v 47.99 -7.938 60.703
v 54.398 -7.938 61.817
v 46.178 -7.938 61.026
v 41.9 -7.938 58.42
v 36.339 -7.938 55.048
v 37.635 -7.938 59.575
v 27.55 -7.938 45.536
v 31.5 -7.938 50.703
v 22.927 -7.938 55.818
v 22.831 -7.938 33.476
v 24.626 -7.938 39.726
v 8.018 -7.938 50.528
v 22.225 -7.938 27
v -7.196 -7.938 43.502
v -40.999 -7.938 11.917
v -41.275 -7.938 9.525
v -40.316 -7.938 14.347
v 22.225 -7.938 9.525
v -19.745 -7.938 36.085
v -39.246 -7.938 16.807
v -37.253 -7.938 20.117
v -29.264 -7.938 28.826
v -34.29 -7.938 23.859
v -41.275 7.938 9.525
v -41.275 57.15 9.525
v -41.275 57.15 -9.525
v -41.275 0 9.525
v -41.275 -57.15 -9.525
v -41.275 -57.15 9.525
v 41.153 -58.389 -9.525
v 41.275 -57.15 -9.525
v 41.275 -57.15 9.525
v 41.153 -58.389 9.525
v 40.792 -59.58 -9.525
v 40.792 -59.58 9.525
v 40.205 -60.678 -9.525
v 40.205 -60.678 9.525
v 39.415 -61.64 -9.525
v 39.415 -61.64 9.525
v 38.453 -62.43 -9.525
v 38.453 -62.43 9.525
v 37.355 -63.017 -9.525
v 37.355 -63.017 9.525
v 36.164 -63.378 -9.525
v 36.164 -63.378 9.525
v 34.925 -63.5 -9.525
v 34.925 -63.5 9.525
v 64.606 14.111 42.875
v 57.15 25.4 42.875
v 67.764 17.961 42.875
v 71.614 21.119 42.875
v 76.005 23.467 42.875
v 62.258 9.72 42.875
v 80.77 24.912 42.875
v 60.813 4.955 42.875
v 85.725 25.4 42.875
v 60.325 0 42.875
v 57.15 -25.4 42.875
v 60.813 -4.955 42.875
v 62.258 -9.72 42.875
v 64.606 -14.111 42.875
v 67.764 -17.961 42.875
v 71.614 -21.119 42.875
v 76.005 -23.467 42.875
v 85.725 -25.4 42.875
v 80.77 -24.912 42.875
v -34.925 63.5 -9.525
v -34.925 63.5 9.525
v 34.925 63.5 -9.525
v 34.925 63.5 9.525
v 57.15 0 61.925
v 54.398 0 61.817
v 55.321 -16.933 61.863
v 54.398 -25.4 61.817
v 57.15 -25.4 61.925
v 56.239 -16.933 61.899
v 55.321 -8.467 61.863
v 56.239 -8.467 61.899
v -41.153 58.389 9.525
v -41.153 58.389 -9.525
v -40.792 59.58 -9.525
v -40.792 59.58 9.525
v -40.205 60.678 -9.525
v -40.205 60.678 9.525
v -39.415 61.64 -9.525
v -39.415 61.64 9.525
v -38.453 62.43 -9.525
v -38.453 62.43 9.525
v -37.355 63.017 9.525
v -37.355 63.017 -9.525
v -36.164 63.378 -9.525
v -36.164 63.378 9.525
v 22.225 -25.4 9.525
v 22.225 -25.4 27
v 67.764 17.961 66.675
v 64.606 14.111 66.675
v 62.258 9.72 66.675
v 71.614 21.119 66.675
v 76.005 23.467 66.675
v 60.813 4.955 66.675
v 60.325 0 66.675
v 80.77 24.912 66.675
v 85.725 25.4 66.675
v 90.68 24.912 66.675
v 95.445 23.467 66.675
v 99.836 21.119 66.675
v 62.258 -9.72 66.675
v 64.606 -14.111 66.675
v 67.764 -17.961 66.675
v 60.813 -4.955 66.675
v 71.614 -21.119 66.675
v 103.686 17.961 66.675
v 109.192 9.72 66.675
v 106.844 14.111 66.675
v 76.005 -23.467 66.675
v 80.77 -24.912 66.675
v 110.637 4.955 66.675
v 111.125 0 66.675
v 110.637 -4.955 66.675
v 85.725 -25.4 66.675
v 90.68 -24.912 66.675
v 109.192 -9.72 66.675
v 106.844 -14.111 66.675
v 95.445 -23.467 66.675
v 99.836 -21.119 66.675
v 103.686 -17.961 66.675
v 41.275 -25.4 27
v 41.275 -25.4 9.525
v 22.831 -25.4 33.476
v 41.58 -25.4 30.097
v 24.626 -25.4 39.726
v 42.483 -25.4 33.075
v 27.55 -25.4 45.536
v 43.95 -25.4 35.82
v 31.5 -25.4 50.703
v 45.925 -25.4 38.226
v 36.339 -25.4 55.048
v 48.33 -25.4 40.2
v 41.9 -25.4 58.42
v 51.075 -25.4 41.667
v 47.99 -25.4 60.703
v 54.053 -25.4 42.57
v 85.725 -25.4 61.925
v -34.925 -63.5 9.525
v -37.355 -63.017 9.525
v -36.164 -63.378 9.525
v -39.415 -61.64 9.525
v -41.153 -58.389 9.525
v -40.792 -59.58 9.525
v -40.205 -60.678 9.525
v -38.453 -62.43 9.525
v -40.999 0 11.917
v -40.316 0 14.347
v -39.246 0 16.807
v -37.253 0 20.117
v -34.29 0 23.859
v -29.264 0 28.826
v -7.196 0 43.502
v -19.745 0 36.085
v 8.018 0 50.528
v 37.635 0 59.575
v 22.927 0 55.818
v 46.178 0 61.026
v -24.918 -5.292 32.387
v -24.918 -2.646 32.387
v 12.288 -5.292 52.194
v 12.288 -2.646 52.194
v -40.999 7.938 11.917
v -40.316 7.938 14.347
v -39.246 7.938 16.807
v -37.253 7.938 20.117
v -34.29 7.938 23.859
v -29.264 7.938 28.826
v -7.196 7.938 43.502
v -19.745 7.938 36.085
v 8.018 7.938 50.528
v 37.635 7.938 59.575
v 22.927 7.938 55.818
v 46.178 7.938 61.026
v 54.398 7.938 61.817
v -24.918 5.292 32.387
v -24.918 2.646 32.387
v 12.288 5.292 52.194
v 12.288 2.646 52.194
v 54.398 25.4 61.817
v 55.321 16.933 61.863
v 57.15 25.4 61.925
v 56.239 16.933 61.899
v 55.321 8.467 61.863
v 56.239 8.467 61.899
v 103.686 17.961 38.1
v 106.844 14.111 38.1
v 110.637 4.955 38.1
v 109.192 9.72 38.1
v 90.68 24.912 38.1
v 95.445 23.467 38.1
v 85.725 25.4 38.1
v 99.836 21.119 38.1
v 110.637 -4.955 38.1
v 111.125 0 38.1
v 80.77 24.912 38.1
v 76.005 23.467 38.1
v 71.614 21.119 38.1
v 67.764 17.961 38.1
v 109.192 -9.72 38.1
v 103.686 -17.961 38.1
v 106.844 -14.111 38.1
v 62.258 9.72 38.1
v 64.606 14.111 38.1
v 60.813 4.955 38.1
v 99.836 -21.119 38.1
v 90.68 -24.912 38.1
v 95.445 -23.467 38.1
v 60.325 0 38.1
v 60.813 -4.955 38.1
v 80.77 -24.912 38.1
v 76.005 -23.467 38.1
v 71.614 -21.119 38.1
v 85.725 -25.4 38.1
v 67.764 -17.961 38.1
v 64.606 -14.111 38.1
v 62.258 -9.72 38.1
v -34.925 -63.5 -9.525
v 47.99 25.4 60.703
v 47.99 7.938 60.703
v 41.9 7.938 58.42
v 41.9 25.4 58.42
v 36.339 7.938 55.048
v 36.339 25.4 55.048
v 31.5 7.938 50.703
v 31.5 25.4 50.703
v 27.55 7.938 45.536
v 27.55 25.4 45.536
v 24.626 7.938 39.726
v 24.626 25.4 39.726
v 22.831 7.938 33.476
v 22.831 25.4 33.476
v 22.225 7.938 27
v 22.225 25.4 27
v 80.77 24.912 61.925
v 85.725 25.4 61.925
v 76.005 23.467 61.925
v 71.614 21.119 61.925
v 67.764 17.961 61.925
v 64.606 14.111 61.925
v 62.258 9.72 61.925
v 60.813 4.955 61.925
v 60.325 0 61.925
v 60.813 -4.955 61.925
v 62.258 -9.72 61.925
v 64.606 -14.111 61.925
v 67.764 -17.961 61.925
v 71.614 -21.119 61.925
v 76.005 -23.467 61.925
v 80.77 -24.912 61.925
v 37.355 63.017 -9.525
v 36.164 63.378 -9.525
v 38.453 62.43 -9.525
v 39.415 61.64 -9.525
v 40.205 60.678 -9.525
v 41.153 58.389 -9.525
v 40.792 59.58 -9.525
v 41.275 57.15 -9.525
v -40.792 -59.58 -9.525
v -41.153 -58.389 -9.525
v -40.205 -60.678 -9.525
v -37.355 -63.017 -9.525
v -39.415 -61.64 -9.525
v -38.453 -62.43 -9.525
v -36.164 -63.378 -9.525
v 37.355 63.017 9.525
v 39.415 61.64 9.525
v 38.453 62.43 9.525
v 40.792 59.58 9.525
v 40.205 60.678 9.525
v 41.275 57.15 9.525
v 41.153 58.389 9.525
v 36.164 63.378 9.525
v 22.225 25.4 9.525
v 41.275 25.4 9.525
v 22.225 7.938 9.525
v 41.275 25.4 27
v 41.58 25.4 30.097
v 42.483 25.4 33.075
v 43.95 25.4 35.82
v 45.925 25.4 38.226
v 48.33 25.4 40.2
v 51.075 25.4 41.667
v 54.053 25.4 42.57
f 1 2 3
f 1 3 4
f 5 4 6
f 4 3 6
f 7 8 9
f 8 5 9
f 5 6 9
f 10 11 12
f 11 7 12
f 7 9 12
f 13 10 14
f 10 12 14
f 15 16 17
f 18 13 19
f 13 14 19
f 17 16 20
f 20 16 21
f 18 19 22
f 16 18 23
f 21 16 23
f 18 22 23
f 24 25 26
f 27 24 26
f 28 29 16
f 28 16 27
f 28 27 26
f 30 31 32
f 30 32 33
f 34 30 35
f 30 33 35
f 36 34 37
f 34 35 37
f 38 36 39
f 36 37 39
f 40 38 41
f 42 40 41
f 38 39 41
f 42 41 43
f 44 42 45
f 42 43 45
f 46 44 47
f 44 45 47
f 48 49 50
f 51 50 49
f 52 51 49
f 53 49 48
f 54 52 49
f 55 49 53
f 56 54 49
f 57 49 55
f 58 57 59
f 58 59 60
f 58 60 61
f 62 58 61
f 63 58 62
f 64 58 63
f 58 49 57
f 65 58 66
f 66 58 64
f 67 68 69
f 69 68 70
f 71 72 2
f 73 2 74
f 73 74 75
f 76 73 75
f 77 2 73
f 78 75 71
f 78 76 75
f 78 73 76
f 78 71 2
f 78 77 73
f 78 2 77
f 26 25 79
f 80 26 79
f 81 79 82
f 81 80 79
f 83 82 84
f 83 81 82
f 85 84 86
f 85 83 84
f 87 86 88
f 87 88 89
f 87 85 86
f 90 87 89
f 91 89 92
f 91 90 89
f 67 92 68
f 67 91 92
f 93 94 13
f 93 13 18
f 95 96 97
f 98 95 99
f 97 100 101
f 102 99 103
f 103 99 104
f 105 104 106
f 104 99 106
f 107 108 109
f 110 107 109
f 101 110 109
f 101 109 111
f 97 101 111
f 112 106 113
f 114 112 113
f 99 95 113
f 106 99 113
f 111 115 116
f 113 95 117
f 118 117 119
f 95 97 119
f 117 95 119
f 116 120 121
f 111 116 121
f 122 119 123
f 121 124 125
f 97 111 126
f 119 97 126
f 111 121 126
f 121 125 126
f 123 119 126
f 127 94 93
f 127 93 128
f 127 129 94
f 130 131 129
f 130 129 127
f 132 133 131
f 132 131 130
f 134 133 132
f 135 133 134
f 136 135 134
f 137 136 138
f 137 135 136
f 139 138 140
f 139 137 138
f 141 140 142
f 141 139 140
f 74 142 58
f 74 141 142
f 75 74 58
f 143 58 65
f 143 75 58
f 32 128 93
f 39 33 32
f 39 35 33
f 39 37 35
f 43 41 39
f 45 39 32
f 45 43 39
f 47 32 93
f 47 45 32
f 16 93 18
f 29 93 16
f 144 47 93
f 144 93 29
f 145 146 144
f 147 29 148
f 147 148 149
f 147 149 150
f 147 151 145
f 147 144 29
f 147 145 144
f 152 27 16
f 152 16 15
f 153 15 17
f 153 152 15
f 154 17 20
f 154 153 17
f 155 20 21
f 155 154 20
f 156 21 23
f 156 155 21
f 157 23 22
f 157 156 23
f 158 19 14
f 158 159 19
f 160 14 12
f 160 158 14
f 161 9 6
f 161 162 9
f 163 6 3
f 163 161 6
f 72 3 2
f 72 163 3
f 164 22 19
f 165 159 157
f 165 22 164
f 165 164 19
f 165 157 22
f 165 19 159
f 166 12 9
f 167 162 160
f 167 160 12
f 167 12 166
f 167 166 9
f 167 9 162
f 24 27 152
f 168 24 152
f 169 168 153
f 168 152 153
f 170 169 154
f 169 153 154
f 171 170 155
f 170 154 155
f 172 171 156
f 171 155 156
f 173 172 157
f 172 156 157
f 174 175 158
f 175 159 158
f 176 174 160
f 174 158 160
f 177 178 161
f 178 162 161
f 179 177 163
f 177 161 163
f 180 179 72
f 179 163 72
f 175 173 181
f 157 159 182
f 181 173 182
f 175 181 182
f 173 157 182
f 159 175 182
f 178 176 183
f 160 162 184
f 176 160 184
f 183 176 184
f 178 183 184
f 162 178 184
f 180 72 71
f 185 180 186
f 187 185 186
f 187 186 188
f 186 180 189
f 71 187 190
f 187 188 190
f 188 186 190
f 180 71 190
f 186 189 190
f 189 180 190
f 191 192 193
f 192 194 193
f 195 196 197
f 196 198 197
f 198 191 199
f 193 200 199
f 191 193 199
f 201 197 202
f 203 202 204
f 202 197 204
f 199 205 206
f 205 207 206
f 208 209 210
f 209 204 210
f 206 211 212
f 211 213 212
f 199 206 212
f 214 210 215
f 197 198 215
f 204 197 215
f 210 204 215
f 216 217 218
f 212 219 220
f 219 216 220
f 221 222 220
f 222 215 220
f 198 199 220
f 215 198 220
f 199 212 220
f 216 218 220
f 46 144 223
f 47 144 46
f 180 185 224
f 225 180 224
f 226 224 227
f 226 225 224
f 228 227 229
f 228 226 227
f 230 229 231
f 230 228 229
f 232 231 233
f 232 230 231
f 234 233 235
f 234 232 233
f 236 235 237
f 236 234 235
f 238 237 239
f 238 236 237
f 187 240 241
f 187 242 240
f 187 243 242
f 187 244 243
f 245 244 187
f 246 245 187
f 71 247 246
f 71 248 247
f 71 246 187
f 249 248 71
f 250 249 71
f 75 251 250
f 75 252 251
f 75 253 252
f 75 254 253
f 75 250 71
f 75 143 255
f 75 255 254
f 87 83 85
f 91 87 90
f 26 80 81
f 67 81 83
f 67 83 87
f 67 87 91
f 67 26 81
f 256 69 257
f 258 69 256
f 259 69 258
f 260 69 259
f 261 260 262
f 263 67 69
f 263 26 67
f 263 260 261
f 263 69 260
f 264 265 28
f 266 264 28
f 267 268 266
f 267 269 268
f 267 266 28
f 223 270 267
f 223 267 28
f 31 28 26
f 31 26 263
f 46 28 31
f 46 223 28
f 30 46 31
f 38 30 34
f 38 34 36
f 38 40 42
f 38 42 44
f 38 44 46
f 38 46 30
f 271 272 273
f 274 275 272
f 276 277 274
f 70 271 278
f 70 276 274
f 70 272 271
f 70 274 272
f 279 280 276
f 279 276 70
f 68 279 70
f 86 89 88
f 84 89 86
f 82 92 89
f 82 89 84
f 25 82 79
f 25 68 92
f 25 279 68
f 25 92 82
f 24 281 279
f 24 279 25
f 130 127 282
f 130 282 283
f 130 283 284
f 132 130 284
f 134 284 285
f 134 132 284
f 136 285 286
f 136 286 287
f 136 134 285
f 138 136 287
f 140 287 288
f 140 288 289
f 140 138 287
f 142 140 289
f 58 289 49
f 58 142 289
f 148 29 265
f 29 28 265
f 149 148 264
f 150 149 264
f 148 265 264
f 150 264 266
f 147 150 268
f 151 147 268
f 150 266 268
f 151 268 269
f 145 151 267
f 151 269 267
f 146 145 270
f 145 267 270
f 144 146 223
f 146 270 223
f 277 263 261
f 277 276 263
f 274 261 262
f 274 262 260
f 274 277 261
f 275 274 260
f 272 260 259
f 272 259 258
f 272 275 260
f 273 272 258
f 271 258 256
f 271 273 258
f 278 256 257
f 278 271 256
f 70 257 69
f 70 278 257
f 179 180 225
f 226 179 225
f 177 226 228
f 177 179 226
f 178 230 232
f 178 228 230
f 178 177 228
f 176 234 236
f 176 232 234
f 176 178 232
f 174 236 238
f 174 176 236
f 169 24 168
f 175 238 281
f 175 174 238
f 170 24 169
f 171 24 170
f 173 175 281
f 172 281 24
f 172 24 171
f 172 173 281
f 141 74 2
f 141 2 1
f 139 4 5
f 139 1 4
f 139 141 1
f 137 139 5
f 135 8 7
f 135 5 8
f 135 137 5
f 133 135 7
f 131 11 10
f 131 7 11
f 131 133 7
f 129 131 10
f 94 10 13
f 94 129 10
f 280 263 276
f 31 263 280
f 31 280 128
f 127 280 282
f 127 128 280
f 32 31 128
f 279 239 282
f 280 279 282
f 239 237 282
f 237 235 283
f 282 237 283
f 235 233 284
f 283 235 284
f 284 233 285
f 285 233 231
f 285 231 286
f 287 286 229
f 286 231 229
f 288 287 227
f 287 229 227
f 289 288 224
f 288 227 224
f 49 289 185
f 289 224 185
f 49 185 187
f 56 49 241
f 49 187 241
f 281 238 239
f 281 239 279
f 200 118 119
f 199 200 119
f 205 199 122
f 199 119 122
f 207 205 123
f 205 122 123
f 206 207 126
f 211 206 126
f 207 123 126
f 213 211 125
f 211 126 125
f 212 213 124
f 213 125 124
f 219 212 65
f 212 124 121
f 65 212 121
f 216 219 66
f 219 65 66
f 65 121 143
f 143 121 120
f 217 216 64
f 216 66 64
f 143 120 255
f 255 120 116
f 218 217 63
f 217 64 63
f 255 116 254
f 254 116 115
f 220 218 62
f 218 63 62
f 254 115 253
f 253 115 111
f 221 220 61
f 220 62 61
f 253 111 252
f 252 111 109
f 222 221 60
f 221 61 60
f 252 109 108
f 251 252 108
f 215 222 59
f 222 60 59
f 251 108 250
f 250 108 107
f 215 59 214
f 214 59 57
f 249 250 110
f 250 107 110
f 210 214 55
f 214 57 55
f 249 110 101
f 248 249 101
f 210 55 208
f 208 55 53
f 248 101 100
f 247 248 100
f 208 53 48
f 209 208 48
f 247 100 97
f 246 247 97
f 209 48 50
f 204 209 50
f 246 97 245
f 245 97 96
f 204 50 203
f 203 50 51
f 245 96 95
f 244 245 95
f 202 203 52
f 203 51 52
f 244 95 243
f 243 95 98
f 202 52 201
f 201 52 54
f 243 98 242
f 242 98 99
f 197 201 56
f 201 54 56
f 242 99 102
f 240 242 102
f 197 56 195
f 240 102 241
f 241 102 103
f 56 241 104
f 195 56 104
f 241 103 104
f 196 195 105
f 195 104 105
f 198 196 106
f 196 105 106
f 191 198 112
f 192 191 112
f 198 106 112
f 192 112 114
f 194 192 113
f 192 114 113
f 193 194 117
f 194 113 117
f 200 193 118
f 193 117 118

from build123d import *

# Parameters (mm, degrees)
F1_DEPTH = 63.5
F2_DEPTH = 25.4
F3_DEPTH = 7.9375
F5_R     = 6.35


with BuildPart() as f1:
    # F0 (on Front) → F1 (new body, symmetric)
    with BuildSketch(Plane.XZ):
        Polygon((22.225, 9.525), (-41.275, 9.525), (-41.275, -9.525), (41.275, -9.525), (41.275, 9.525), align=None)
    extrude(amount=F1_DEPTH, both=True)

    # F0 (on Front) → F2 (join, symmetric)
    with BuildSketch(Plane.XZ):
        with BuildLine():
            Line((22.225, 27.0002), (22.225, 9.525))
            Line((22.225, 9.525), (41.275, 9.525))
            Line((41.275, 9.525), (41.275, 27.0002))
            ThreePointArc((41.275, 27.0002), (45.9246798487, 38.2255201513), (57.15, 42.8752))
            Line((57.15, 42.8752), (60.325, 42.8752))
            Line((60.325, 42.8752), (60.325, 61.9252))
            Line((60.325, 61.9252), (57.15, 61.9252))
            add(Edge.make_bspline(
                [(54.3975584456, 61.8165710126), (55.3245975256, 61.8674152236), (56.2423933206, 61.9037658761), (57.15, 61.9252)],
                knots=[108.931400428, 108.931400428, 108.931400428, 108.931400428, 111.5045361635, 111.5045361635, 111.5045361635, 111.5045361635], degree=3))
            ThreePointArc((54.3975584456, 61.8165710126), (31.4996135869, 50.7028011623), (22.225, 27.0002))
        make_face()
        Polygon((85.725, 61.9252), (60.325, 61.9252), (60.325, 42.8752), (85.725, 42.8752), (85.725, 52.3875), align=None)
    extrude(amount=F2_DEPTH, both=True)

    # F0 (on Front) → F3 (join, symmetric)
    with BuildSketch(Plane.XZ):
        with BuildLine():
            add(Edge.make_bspline(
                [(-41.275, 9.525), (-40.658780826, 31.5366673239), (15.1521879644, 59.6641268054), (54.3975584456, 61.8165710126)],
                knots=[0, 0, 0, 0, 108.931400428, 108.931400428, 108.931400428, 108.931400428], degree=3))
            Line((-41.275, 9.525), (22.225, 9.525))
            Line((22.225, 9.525), (22.225, 27.0002))
            ThreePointArc((22.225, 27.0002), (31.4996135869, 50.7028011623), (54.3975584456, 61.8165710126))
        make_face()
    extrude(amount=F3_DEPTH, both=True)

    # F0 (on Front) → F4 (revolve)
    with BuildSketch(Plane.XZ):
        Polygon((85.725, 66.675), (85.725, 61.9252), (85.725, 52.3875), (85.725, 42.8752), (85.725, 38.1), (111.125, 38.1), (111.125, 66.675), align=None)
    revolve(axis=Axis((85.725, 0, 45.24375), (0, 0, -1)))

    # F5
    f5_edges = [f1.edges().sort_by_distance(p)[0] for p in [
        (-41.275, -63.5, 0),
        (41.275, -63.5, 0),
        (41.275, 63.5, 0),
        (-41.275, 63.5, 0),
    ]]
    fillet(f5_edges, radius=F5_R)


solid = f1.part
